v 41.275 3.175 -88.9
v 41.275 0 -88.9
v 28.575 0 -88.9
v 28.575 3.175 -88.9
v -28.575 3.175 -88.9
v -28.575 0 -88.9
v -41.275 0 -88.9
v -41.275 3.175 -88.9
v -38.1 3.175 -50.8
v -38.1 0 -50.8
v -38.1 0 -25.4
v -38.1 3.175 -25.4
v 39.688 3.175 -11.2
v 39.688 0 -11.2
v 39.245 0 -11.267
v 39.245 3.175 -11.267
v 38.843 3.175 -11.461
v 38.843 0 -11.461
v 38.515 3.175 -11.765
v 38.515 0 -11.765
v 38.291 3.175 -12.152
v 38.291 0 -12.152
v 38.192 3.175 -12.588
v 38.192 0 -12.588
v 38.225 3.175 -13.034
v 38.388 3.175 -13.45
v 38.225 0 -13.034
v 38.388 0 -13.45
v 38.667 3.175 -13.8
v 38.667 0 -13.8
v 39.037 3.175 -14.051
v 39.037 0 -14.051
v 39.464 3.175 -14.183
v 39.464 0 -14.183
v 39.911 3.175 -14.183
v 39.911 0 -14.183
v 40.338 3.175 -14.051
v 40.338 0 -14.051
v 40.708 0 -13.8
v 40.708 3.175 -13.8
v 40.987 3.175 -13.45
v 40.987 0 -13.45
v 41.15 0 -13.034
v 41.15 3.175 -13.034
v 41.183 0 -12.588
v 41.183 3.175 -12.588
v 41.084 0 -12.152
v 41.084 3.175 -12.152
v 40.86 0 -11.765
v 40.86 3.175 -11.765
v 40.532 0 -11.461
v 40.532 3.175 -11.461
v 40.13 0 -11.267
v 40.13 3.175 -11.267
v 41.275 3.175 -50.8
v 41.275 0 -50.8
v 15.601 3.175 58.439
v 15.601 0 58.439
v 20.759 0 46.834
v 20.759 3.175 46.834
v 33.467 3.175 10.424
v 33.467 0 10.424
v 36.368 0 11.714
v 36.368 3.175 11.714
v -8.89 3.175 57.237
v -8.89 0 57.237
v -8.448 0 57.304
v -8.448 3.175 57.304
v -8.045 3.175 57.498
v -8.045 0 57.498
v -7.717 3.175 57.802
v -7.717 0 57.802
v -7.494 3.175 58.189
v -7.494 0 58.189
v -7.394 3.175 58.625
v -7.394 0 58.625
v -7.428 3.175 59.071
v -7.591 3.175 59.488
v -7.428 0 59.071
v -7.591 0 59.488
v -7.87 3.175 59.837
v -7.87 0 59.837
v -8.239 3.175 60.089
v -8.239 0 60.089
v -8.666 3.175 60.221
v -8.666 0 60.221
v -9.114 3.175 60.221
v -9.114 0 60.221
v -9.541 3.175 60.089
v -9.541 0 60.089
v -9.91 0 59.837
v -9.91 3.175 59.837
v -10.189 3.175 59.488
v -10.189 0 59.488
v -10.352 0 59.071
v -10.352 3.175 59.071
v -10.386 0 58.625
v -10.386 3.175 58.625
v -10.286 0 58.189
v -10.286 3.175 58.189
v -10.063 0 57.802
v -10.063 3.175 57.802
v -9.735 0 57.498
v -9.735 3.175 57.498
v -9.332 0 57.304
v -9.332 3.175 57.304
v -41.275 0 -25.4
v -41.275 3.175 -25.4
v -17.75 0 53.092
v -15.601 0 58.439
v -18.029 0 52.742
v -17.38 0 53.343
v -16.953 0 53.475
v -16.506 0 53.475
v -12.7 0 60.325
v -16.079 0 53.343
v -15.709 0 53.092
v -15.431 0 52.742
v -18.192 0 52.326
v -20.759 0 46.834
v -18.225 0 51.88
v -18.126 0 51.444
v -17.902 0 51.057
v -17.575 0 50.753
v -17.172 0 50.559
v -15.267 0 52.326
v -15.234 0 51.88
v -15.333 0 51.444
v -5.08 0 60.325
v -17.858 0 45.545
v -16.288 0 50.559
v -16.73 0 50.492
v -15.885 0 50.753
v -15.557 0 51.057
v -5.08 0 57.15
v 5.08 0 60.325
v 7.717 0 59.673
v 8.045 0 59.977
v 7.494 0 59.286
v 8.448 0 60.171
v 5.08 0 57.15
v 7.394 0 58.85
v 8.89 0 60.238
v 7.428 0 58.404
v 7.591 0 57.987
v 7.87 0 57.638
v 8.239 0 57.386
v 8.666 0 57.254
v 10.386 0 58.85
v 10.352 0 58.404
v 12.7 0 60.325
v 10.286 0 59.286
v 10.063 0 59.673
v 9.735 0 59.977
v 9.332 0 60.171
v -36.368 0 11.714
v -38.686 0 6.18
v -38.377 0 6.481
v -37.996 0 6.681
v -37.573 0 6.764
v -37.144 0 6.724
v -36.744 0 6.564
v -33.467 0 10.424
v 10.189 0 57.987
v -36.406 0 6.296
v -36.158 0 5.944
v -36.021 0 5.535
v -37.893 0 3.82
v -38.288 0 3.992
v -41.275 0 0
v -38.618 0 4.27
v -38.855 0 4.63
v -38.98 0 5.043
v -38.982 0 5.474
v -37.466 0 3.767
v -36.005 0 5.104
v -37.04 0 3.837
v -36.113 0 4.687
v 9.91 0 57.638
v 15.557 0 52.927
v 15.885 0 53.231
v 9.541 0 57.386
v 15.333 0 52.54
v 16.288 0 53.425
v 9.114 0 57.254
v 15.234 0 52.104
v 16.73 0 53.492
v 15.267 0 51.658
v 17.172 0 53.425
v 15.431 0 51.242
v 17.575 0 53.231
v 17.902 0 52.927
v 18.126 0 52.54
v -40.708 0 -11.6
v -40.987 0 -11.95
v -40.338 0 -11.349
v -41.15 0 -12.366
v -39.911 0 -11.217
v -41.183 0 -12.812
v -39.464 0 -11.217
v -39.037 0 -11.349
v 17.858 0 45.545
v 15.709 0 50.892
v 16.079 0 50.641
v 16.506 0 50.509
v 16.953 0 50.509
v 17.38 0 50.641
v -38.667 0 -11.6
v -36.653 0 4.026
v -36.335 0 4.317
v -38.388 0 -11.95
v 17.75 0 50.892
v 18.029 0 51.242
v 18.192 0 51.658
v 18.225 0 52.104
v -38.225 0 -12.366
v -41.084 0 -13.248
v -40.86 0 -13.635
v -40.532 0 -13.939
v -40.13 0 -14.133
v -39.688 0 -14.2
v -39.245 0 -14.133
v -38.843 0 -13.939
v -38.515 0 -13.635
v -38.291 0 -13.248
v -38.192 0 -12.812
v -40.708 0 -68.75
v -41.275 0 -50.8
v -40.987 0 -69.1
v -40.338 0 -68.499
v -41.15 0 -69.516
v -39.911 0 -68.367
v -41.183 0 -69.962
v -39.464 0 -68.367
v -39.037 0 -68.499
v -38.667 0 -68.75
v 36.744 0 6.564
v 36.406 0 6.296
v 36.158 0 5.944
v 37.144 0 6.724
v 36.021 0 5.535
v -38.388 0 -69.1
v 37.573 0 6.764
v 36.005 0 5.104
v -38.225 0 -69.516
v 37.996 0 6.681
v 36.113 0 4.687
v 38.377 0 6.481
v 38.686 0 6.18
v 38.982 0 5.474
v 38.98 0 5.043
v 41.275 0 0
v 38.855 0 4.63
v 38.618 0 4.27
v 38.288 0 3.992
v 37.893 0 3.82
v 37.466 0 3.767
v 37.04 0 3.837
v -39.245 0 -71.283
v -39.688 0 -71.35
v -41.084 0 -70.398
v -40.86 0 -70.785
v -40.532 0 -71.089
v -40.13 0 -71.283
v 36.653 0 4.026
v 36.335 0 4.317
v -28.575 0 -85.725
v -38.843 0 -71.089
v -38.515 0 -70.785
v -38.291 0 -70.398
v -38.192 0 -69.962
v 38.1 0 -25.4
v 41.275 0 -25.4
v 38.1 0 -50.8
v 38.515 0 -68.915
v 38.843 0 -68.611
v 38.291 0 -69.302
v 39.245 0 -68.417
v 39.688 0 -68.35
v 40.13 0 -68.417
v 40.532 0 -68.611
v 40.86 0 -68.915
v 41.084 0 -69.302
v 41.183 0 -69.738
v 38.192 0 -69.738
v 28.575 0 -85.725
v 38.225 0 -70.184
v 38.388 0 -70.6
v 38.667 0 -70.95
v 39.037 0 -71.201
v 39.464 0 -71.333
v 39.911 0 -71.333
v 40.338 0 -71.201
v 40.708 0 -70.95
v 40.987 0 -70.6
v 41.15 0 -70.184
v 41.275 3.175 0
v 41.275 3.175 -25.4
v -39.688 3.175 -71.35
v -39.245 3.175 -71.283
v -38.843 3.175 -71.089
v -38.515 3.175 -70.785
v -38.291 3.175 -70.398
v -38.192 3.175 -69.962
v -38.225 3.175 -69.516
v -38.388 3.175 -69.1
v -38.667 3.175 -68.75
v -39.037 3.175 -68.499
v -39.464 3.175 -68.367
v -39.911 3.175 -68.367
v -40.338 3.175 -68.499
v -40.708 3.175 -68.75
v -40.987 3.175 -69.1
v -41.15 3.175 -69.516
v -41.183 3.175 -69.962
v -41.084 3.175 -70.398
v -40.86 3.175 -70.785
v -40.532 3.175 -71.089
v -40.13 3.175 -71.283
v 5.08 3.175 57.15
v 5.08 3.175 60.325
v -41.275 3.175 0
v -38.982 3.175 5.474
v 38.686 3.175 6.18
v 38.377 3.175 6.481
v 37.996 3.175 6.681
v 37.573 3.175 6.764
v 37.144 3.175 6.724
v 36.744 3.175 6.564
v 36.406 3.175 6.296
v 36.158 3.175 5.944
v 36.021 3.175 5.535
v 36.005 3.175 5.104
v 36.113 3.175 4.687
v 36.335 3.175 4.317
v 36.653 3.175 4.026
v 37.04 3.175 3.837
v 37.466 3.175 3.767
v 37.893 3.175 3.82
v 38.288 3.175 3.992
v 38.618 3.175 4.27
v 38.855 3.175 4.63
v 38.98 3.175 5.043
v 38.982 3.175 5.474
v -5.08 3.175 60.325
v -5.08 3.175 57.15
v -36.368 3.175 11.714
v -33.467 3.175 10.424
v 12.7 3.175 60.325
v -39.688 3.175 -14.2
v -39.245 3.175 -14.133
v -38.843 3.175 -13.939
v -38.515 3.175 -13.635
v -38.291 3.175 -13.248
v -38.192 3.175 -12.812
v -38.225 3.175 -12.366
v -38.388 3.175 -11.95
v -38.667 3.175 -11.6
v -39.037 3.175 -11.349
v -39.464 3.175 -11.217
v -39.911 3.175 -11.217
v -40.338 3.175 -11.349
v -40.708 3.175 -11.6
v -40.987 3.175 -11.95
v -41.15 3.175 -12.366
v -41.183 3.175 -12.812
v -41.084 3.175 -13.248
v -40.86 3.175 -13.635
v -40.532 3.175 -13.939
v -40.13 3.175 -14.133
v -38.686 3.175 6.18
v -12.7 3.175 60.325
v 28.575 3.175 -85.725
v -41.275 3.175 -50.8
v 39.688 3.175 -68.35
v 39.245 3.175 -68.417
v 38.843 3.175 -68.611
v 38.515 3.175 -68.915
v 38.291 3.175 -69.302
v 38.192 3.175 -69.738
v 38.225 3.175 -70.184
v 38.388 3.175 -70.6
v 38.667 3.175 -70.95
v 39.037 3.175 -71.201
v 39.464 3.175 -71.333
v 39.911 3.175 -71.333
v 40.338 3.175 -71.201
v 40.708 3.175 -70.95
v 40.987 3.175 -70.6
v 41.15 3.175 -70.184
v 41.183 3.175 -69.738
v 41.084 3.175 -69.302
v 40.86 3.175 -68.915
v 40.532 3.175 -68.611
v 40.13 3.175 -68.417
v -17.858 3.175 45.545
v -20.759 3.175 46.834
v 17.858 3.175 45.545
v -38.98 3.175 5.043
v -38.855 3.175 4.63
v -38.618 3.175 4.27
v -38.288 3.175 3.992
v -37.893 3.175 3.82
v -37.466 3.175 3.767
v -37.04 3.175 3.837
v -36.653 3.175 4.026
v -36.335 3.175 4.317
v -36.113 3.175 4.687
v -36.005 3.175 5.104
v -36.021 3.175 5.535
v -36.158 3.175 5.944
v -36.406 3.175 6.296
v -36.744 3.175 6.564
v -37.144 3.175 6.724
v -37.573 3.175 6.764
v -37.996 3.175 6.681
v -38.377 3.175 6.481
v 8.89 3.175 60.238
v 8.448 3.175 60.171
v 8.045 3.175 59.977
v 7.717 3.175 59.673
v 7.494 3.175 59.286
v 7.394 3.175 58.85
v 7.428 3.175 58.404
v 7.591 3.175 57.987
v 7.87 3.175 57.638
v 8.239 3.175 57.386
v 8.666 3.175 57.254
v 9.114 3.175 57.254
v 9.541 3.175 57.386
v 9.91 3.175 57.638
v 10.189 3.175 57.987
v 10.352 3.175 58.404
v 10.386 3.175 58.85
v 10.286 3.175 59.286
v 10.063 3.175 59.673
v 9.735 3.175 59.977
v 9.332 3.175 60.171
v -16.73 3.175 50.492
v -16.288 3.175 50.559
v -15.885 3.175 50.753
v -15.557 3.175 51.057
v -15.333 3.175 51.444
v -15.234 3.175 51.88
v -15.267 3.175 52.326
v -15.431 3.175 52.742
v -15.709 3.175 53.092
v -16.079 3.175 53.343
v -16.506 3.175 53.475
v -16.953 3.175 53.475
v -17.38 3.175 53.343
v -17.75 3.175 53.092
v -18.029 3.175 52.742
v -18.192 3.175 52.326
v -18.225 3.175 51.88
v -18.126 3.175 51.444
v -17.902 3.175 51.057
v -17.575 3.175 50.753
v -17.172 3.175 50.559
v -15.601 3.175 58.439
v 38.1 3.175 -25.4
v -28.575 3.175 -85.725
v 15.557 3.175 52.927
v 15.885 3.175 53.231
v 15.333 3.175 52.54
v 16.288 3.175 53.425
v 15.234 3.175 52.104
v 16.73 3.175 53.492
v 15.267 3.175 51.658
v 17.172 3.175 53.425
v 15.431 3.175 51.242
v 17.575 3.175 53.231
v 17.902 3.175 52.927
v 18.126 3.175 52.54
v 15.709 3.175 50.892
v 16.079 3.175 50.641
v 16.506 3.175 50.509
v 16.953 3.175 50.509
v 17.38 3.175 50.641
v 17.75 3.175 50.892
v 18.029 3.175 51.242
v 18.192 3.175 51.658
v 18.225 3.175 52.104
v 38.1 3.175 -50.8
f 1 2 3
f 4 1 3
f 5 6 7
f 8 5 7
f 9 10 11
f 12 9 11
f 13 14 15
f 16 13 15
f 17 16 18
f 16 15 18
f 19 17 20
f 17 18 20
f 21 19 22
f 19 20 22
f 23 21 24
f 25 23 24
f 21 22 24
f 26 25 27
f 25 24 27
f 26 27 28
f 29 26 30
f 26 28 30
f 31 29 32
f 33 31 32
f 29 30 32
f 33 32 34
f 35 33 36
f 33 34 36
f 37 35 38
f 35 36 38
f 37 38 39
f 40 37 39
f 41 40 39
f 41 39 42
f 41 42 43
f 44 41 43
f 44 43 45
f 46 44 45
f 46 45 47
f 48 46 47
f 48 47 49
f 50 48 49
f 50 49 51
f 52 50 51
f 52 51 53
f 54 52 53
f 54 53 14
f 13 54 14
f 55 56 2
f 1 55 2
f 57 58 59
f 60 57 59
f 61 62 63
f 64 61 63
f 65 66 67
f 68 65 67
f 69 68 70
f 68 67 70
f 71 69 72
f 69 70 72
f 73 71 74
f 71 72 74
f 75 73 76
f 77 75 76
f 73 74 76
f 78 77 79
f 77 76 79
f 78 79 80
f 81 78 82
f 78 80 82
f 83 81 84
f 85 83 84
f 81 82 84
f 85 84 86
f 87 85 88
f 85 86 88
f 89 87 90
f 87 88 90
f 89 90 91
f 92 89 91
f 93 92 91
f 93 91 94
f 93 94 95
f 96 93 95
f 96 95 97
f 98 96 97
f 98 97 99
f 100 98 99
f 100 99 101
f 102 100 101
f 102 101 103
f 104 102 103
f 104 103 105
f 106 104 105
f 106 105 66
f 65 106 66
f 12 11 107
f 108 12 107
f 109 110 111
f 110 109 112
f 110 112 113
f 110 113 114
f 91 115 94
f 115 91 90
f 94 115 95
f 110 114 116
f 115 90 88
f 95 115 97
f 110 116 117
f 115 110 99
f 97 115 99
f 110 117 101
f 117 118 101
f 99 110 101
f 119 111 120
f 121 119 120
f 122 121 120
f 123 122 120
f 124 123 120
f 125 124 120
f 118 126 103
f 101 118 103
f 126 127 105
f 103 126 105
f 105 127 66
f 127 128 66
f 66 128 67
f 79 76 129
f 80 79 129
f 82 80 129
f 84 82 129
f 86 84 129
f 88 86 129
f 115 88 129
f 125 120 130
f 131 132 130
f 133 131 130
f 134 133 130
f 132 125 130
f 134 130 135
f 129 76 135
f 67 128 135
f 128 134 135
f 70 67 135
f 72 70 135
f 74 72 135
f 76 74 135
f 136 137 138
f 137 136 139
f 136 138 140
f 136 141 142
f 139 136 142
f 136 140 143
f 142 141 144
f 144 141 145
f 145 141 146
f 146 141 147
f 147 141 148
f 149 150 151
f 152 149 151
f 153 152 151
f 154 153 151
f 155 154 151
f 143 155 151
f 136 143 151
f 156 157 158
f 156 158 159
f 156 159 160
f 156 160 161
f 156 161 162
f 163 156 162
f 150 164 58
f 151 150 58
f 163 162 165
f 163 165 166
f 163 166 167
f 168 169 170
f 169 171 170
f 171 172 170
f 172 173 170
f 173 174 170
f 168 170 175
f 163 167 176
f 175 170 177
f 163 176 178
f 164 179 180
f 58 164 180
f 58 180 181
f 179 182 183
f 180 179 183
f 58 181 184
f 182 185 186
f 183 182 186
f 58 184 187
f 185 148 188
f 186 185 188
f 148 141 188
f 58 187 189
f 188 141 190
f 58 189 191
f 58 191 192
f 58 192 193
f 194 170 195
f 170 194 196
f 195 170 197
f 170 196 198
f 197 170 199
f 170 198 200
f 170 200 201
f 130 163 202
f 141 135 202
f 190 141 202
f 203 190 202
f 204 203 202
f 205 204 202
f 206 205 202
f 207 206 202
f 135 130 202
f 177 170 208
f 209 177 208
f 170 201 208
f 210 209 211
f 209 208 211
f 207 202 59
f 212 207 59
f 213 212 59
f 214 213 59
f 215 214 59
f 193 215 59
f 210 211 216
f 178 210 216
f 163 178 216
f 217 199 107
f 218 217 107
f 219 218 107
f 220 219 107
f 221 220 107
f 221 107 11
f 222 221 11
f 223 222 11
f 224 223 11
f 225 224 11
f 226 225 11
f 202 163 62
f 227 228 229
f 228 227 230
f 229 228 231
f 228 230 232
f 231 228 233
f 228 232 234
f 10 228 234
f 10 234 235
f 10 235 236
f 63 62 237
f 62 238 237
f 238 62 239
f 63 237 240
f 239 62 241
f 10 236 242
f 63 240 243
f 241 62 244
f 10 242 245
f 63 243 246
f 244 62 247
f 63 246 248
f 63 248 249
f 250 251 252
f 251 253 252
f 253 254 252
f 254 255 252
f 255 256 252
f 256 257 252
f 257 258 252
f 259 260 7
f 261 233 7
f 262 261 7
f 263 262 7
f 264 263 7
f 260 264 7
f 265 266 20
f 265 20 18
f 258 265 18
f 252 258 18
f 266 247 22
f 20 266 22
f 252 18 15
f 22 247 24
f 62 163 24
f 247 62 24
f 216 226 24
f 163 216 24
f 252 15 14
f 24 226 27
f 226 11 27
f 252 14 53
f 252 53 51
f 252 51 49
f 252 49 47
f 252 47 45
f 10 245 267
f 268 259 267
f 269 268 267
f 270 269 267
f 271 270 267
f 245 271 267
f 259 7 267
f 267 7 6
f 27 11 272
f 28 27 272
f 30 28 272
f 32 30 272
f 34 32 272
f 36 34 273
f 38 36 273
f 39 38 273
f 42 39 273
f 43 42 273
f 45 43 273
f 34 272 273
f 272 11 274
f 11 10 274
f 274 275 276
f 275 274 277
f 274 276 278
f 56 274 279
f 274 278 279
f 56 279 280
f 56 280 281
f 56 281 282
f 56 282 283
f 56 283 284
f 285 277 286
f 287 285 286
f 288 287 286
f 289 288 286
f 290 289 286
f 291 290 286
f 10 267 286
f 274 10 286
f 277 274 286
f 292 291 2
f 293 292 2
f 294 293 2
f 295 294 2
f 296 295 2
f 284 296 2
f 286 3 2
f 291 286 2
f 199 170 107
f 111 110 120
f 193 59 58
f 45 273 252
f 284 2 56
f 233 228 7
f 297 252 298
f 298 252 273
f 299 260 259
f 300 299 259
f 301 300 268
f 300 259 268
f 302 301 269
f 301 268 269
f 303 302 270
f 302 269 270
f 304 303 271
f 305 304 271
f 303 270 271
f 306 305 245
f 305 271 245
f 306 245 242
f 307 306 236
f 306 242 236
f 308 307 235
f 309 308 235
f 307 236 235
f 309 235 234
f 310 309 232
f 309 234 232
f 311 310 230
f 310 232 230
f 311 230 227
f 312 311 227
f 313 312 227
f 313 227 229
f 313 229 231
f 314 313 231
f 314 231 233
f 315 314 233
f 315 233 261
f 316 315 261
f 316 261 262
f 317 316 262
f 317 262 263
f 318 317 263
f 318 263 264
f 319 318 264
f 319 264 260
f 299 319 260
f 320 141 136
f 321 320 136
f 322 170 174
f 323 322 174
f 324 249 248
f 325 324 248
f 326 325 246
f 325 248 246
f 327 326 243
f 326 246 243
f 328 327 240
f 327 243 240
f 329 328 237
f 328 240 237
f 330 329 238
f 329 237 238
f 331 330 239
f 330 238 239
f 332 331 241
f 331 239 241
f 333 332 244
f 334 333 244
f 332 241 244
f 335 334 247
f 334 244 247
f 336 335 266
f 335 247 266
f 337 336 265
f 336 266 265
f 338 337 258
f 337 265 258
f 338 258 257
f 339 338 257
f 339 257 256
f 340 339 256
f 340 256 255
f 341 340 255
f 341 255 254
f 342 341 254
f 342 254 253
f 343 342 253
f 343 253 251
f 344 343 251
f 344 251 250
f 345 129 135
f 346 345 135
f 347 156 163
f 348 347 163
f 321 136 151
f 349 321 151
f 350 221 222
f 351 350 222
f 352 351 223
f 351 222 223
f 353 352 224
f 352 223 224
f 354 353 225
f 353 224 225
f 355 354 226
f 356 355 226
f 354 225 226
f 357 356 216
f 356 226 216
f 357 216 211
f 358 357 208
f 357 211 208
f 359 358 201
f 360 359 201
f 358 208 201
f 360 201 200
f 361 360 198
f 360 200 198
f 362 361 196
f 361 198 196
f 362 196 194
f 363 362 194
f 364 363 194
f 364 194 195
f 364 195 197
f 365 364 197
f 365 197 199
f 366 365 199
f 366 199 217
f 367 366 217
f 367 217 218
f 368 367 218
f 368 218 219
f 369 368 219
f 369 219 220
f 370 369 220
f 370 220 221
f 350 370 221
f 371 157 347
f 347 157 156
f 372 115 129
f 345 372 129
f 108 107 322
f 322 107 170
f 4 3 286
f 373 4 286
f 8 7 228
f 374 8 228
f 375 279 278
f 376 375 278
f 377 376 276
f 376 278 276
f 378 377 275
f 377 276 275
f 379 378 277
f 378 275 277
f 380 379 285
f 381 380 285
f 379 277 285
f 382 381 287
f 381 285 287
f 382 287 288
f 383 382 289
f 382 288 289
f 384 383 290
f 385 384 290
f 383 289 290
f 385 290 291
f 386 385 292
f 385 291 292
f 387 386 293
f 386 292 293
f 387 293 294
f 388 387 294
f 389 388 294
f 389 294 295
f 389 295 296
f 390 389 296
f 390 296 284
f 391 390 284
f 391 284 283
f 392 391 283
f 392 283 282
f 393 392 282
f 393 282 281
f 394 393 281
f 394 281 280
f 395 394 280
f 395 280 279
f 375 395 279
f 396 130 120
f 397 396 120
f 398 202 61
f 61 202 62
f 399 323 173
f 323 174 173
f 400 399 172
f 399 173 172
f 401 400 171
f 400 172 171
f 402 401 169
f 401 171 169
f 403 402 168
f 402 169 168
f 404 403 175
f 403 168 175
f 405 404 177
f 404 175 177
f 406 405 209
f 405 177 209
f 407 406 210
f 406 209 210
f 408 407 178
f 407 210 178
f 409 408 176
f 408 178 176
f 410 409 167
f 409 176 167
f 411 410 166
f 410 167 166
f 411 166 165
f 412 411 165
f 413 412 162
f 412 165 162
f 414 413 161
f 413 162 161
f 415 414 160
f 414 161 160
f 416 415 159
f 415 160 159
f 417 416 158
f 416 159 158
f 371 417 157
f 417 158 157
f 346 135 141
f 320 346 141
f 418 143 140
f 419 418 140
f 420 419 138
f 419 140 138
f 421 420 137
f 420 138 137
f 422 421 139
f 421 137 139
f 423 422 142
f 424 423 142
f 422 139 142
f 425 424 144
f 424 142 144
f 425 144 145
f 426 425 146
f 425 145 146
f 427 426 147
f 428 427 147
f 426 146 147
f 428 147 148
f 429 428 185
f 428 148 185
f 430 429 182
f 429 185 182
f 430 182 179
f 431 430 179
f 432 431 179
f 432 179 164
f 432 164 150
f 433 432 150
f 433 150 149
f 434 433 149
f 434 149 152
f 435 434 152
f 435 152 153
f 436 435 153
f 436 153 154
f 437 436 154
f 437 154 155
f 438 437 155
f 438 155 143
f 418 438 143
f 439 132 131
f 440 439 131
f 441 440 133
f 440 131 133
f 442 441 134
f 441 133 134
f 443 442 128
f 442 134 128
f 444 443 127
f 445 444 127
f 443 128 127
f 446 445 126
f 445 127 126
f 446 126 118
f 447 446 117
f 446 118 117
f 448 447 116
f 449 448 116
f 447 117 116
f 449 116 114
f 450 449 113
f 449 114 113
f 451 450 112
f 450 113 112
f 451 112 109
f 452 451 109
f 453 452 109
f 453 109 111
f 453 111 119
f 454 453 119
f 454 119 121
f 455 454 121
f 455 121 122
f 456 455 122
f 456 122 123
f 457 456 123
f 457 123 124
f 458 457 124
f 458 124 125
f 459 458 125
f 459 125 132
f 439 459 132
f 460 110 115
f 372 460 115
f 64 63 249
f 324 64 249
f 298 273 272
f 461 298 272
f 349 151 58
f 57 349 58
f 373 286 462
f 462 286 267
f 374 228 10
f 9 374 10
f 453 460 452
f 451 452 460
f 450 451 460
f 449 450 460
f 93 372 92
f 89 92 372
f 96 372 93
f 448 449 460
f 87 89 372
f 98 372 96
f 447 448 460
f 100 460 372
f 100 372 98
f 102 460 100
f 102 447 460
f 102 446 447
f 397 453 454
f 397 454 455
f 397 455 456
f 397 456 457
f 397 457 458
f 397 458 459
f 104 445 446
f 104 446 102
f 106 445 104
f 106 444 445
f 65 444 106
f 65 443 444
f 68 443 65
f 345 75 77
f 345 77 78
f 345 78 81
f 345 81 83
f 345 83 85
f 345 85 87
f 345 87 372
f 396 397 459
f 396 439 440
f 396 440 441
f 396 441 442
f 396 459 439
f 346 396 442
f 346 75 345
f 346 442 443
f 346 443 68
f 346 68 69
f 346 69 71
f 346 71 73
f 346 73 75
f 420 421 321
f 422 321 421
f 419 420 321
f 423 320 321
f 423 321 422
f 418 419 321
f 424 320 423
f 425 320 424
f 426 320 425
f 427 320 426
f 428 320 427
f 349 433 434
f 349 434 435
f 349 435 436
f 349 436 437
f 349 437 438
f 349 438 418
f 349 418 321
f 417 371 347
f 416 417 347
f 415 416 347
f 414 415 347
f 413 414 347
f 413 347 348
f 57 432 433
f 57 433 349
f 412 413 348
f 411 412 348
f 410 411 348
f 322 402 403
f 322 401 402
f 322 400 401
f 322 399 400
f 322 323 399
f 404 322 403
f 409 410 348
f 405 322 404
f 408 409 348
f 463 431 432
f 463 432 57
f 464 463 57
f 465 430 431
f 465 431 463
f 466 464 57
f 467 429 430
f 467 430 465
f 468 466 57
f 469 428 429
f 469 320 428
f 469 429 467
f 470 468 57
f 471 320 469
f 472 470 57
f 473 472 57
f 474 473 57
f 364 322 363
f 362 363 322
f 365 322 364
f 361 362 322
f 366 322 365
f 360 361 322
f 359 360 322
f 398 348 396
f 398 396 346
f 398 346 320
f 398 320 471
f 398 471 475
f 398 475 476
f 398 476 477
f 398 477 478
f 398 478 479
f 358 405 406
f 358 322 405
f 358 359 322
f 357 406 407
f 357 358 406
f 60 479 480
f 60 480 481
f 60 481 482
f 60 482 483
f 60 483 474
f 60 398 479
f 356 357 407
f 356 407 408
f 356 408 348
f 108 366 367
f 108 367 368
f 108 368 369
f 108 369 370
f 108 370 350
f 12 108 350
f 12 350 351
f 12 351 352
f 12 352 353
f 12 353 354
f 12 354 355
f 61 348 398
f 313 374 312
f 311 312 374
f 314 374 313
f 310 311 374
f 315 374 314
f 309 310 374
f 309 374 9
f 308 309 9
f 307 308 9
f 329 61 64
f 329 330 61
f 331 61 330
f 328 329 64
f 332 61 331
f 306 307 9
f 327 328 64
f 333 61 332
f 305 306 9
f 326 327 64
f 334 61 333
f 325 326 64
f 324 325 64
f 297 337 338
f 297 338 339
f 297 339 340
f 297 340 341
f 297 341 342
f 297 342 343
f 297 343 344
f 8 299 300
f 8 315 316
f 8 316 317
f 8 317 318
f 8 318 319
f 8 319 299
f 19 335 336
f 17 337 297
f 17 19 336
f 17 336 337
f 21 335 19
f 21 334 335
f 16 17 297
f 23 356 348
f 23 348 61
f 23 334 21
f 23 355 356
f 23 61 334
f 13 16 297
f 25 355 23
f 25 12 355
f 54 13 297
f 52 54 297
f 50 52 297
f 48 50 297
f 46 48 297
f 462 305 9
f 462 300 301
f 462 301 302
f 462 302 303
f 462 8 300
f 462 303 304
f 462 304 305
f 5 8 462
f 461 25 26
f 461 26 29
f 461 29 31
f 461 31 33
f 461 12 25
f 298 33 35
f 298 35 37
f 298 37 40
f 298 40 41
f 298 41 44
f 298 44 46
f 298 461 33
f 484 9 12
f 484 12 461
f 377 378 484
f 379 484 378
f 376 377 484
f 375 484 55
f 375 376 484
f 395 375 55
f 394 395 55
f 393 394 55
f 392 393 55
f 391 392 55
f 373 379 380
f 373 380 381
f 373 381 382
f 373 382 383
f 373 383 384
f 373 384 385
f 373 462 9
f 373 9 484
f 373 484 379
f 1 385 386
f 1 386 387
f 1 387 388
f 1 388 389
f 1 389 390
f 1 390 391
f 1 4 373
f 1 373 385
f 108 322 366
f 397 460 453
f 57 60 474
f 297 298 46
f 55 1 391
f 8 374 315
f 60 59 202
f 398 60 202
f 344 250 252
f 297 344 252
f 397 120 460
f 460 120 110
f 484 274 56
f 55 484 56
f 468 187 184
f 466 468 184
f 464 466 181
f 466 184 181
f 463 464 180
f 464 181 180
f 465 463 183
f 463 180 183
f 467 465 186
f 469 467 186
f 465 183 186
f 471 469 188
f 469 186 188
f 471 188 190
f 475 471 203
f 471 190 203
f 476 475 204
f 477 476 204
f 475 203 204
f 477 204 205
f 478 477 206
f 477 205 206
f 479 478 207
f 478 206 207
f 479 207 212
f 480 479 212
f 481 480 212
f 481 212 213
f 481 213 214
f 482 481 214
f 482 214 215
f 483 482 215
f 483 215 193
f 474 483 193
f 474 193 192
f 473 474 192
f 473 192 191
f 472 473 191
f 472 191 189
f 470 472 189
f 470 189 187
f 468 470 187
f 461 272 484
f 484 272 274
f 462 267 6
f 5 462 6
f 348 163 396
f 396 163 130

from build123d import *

# Parameters (mm, degrees)
BOSS_EXTRUDE1_DEPTH = 3.175
SKETCH2_R           = 1.5
SKETCH2_R_2         = 1.500000048
CUT_EXTRUDE1_DEPTH  = 99.065877093


with BuildPart() as part:
    # Sketch1 → Boss-Extrude1 (new body)
    with BuildSketch(Plane(origin=(0, 0, 0), x_dir=(1, 0, 0), z_dir=(0, 1, 0))):
        Polygon((-41.275, 0), (-36.368301991, -11.713851401), (-33.466950324, -10.424361771), (-17.857958519, -45.544593333), (-20.759310186, -46.834082962), (-15.601351667, -58.43948963), (-12.7, -60.325), (-5.08, -60.325), (-5.08, -57.15), (5.08, -57.15), (5.08, -60.325), (12.7, -60.325), (15.601351667, -58.43948963), (20.759310186, -46.834082962), (17.857958519, -45.544593333), (33.466950324, -10.424361771), (36.368301991, -11.713851401), (41.275, 0), (41.275, 25.4), (38.1, 25.4), (38.1, 50.8), (41.275, 50.8), (41.275, 88.9), (28.575, 88.9), (28.575, 85.725), (3.175, 85.725), (-3.175, 85.725), (-28.575, 85.725), (-28.575, 88.9), (-41.275, 88.9), (-41.275, 50.8), (-38.1, 50.8), (-38.1, 25.4), (-41.275, 25.4), align=None)
    extrude(amount=BOSS_EXTRUDE1_DEPTH)

    # Sketch2 → Cut-Extrude1 (cut, through all)
    with BuildSketch(Plane(origin=(0, 0, 0), x_dir=(-1, 0, 0), z_dir=(0, -1, 0))):
        with Locations(Location((39.6875, 69.85, 0), (0, 0, 90))):
            Circle(SKETCH2_R)
        with Locations(Location((-8.89, -58.7375, 0), (0, 0, 270))):
            Circle(SKETCH2_R_2)
        with Locations(Location((39.6875, 12.7, 0), (0, 0, 90))):
            Circle(SKETCH2_R_2)
        with Locations((37.496605417, -5.266403252)):
            Circle(SKETCH2_R_2)
        with Locations(Location((16.729655093, -51.992041481, 0), (0, 0, 90))):
            Circle(SKETCH2_R_2)
        with Locations(Location((8.89, -58.7375, 0), (0, 0, 90))):
            Circle(SKETCH2_R_2)
        with Locations(Location((-16.729655093, -51.992041481, 0), (0, 0, 270))):
            Circle(SKETCH2_R_2)
        with Locations((-37.496605417, -5.266403252)):
            Circle(SKETCH2_R_2)
        with Locations(Location((-39.6875, 12.7, 0), (0, 0, 270))):
            Circle(SKETCH2_R_2)
        with Locations(Location((-39.6875, 69.85, 0), (0, 0, 270))):
            Circle(SKETCH2_R)
    extrude(amount=-CUT_EXTRUDE1_DEPTH, mode=Mode.SUBTRACT)


solid = part.part
